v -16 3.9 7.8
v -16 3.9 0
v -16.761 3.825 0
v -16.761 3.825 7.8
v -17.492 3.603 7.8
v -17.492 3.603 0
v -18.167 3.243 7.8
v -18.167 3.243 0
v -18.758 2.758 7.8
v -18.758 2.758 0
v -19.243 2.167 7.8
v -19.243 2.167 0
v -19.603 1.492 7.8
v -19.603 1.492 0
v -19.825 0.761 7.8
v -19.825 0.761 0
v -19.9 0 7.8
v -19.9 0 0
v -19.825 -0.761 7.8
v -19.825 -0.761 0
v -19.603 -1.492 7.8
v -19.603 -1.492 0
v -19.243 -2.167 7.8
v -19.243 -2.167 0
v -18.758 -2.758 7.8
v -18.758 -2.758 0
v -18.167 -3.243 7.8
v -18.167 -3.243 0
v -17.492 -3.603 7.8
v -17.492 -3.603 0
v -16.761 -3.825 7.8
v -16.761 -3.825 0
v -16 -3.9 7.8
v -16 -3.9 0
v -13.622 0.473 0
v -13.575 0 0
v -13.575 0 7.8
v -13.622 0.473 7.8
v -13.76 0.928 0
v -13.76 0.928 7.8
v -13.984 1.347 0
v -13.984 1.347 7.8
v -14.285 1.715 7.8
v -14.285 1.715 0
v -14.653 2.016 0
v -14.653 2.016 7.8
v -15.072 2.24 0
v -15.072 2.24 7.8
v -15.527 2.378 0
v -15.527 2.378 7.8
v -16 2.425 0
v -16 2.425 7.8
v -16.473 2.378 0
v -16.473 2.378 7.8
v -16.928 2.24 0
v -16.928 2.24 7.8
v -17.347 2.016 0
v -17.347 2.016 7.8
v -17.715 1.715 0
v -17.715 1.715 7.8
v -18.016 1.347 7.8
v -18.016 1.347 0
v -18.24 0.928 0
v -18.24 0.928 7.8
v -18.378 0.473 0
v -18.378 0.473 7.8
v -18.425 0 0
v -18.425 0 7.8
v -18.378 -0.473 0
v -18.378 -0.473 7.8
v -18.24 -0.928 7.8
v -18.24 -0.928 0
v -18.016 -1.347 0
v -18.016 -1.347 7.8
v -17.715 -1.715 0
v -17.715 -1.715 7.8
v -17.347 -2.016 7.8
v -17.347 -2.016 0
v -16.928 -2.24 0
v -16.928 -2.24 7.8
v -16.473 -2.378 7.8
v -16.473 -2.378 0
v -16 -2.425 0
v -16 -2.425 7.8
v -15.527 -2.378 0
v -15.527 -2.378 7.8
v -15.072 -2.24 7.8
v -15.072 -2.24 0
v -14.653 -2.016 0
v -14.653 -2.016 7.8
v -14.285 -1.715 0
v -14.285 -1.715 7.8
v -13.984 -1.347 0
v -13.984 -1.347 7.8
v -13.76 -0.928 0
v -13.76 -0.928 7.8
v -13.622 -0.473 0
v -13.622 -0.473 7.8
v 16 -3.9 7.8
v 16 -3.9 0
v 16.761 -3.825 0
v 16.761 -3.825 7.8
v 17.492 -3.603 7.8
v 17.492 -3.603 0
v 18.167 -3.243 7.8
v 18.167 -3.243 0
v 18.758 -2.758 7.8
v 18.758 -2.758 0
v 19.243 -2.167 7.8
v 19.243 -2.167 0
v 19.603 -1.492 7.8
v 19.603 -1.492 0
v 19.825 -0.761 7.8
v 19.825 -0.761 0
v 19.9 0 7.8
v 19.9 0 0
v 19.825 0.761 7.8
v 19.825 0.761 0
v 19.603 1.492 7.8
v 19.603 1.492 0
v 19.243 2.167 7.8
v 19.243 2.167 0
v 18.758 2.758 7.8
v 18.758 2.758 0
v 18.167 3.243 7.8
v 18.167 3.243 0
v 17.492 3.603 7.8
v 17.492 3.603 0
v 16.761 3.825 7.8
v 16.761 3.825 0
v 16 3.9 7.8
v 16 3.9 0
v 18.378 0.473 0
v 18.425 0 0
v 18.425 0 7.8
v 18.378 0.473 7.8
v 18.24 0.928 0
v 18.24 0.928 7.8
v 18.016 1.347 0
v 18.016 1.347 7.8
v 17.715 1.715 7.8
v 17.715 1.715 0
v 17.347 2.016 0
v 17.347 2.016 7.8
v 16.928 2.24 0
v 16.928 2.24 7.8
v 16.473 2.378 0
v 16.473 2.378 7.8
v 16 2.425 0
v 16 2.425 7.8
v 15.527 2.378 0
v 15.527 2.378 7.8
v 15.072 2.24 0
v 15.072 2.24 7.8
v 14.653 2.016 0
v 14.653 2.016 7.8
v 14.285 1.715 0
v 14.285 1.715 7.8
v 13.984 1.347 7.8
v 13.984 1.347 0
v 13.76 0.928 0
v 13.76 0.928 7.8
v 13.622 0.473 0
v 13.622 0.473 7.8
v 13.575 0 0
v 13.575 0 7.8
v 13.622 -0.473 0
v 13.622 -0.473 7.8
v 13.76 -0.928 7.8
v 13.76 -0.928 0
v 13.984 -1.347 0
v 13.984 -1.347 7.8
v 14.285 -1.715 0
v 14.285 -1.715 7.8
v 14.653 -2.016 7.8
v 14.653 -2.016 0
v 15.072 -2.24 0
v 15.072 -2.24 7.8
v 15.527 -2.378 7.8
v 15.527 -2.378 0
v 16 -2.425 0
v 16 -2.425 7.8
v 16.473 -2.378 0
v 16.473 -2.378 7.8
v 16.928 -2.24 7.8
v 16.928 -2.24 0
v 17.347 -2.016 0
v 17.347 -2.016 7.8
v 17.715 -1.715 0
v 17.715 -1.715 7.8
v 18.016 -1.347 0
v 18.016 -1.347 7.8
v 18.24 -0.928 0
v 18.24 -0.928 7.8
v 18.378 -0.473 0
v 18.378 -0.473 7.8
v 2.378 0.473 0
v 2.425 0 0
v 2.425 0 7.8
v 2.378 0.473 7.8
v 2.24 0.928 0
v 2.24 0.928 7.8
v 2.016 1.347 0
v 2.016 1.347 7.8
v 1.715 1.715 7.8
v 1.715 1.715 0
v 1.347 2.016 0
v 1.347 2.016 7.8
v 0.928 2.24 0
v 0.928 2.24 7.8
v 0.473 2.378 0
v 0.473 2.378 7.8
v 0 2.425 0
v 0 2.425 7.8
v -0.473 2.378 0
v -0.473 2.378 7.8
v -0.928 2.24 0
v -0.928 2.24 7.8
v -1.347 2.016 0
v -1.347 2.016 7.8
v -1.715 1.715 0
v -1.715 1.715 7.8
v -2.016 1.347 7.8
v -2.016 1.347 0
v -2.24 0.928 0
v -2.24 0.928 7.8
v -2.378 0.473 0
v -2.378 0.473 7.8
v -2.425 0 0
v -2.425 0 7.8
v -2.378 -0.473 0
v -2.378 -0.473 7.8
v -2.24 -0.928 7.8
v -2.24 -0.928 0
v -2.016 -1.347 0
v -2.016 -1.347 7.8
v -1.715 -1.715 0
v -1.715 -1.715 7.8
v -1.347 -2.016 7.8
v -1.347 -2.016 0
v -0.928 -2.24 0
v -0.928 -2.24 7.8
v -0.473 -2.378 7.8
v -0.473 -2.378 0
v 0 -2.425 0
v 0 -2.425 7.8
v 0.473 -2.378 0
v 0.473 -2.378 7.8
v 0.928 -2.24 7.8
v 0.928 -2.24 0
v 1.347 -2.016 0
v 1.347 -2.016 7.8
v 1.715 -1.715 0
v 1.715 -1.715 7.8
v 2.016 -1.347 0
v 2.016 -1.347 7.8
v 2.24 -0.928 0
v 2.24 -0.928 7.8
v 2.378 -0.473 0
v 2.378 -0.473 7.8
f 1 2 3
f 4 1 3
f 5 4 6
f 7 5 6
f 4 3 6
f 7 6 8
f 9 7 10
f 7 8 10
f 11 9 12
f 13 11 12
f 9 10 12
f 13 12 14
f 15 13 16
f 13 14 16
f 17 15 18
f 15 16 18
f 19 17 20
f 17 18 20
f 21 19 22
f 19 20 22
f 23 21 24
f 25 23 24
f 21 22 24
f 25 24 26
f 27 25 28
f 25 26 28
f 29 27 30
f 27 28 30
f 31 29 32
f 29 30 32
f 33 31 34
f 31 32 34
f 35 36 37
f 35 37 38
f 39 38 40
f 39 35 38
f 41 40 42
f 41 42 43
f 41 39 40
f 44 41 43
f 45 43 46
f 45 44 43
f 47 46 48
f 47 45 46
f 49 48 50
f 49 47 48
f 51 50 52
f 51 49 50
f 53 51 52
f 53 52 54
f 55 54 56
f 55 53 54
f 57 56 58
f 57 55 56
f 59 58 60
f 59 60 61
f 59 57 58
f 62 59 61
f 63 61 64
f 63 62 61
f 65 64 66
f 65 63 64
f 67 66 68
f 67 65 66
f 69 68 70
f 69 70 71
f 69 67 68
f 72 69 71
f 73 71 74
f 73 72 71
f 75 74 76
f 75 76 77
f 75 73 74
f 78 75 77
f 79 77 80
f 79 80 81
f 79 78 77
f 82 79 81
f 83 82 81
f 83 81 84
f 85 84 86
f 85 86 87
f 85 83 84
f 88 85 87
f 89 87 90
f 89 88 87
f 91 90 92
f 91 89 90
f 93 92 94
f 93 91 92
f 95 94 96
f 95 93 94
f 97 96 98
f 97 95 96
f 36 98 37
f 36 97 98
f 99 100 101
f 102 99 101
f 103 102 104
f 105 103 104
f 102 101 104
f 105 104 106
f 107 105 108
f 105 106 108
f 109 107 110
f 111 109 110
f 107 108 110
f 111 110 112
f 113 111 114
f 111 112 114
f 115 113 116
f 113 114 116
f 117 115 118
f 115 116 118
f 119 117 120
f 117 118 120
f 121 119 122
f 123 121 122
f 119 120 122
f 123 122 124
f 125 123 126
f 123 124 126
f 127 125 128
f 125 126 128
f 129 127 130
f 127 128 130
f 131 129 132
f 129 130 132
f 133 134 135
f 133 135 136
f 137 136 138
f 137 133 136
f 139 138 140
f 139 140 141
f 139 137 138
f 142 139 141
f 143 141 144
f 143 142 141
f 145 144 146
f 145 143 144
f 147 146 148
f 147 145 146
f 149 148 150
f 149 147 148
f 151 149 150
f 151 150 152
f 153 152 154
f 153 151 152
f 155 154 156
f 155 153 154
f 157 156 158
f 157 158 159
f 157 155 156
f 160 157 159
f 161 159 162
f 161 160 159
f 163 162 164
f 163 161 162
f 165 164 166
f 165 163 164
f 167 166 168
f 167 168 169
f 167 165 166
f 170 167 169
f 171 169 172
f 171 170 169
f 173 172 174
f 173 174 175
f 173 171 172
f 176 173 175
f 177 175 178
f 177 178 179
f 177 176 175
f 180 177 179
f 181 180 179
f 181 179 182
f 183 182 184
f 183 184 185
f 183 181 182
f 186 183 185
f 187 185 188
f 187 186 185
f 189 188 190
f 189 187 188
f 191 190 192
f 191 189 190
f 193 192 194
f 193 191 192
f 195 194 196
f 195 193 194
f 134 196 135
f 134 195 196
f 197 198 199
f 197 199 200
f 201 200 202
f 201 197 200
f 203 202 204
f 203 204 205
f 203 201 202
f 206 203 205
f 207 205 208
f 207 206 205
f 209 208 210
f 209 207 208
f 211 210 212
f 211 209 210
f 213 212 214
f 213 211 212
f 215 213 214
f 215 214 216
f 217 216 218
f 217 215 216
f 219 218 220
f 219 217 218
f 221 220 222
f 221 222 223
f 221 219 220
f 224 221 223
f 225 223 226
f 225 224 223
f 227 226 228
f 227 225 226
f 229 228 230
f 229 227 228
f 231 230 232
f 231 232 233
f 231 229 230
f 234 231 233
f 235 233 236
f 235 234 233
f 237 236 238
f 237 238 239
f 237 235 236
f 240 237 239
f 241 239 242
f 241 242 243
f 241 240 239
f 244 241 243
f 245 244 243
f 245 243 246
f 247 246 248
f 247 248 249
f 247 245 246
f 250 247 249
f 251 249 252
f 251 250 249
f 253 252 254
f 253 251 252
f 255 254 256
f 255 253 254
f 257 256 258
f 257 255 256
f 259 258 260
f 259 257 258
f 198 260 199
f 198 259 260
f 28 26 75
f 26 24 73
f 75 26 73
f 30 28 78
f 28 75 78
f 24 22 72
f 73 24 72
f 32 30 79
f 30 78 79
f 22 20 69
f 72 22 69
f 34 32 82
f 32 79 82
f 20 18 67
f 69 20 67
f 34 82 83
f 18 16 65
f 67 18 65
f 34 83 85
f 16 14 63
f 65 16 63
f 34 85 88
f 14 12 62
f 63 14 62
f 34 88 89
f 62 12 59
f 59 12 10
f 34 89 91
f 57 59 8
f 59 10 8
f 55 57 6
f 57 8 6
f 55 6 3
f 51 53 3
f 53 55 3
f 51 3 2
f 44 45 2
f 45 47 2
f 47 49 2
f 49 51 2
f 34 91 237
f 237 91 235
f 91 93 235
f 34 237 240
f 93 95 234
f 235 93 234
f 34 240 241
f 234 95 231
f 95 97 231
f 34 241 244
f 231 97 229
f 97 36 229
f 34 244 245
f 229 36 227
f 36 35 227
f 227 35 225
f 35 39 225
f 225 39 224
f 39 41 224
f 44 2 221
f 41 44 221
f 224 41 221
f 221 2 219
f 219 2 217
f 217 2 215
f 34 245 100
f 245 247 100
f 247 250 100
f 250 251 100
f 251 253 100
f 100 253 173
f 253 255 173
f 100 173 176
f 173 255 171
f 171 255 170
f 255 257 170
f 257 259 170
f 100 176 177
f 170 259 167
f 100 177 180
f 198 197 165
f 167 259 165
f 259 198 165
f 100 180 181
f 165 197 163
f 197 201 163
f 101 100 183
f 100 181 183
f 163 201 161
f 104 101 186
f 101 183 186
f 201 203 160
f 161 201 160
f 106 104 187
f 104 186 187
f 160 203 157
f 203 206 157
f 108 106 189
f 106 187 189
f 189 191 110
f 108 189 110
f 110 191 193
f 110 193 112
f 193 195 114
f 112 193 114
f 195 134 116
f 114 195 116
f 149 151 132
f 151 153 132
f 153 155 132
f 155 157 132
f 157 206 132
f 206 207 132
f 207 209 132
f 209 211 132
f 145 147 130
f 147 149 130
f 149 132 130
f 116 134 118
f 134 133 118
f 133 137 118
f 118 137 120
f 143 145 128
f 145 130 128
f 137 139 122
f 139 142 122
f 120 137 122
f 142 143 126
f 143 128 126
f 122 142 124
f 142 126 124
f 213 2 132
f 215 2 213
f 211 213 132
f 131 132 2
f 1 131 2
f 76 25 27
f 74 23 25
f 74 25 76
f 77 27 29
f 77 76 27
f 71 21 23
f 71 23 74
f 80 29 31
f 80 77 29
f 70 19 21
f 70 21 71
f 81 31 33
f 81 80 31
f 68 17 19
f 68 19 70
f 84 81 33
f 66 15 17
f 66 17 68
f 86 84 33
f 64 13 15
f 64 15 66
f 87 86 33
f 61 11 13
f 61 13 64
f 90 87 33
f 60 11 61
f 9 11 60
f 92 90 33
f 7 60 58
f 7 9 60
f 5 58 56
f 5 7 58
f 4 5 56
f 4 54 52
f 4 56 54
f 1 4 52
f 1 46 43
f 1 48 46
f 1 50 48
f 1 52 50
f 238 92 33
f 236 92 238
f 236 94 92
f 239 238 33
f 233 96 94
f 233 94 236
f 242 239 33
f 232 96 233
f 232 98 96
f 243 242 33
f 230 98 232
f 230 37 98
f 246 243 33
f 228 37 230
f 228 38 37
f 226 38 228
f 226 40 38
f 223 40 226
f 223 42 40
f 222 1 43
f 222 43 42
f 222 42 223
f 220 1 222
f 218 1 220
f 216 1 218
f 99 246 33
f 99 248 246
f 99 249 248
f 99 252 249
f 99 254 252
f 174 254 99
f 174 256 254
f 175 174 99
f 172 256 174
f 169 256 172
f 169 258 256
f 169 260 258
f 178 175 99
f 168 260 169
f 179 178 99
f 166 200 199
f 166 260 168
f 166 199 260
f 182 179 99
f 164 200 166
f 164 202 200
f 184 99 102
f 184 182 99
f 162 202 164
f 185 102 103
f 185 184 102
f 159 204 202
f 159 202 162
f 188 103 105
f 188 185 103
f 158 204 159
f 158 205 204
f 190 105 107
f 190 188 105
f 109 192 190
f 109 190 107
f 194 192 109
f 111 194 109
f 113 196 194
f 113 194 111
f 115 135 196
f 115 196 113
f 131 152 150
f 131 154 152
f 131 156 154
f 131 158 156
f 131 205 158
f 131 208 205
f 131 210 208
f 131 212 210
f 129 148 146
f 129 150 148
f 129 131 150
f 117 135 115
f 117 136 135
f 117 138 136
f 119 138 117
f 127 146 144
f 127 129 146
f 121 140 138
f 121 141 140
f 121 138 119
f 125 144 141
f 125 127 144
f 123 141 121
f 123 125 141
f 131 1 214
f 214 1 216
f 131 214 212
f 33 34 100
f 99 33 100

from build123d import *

# Parameters (mm, degrees)
F0_R     = 2.425
F1_DEPTH = 7.8
F2_R     = 2.425
F3_DEPTH = 7.8


with BuildPart() as f1:
    # F0 (on Top) → F1 (new body)
    with BuildSketch(Plane.XY):
        with BuildLine():
            ThreePointArc((16, -3.9), (19.9, 0), (16, 3.9))
            Line((16, 3.9), (-16, 3.9))
            ThreePointArc((-16, 3.9), (-19.9, 0), (-16, -3.9))
            Line((-16, -3.9), (16, -3.9))
        make_face()
        with Locations((-16, 0)):
            Circle(F0_R, mode=Mode.SUBTRACT)
        Circle(F0_R, mode=Mode.SUBTRACT)
        with Locations((16, 0)):
            Circle(F0_R, mode=Mode.SUBTRACT)
    extrude(amount=F1_DEPTH)

    # F2 (on face) → F3 (join)
    with BuildSketch(Plane.XZ.offset(3.9)):
        with Locations((-8, 3.9)):
            Circle(F2_R)
        with BuildLine():
            ThreePointArc((10.425, 3.9), (8, 6.325), (5.575, 3.9))
            ThreePointArc((5.575, 3.9), (8, 1.475), (10.425, 3.9))
        make_face()
    extrude(amount=-F3_DEPTH)


solid = f1.part
